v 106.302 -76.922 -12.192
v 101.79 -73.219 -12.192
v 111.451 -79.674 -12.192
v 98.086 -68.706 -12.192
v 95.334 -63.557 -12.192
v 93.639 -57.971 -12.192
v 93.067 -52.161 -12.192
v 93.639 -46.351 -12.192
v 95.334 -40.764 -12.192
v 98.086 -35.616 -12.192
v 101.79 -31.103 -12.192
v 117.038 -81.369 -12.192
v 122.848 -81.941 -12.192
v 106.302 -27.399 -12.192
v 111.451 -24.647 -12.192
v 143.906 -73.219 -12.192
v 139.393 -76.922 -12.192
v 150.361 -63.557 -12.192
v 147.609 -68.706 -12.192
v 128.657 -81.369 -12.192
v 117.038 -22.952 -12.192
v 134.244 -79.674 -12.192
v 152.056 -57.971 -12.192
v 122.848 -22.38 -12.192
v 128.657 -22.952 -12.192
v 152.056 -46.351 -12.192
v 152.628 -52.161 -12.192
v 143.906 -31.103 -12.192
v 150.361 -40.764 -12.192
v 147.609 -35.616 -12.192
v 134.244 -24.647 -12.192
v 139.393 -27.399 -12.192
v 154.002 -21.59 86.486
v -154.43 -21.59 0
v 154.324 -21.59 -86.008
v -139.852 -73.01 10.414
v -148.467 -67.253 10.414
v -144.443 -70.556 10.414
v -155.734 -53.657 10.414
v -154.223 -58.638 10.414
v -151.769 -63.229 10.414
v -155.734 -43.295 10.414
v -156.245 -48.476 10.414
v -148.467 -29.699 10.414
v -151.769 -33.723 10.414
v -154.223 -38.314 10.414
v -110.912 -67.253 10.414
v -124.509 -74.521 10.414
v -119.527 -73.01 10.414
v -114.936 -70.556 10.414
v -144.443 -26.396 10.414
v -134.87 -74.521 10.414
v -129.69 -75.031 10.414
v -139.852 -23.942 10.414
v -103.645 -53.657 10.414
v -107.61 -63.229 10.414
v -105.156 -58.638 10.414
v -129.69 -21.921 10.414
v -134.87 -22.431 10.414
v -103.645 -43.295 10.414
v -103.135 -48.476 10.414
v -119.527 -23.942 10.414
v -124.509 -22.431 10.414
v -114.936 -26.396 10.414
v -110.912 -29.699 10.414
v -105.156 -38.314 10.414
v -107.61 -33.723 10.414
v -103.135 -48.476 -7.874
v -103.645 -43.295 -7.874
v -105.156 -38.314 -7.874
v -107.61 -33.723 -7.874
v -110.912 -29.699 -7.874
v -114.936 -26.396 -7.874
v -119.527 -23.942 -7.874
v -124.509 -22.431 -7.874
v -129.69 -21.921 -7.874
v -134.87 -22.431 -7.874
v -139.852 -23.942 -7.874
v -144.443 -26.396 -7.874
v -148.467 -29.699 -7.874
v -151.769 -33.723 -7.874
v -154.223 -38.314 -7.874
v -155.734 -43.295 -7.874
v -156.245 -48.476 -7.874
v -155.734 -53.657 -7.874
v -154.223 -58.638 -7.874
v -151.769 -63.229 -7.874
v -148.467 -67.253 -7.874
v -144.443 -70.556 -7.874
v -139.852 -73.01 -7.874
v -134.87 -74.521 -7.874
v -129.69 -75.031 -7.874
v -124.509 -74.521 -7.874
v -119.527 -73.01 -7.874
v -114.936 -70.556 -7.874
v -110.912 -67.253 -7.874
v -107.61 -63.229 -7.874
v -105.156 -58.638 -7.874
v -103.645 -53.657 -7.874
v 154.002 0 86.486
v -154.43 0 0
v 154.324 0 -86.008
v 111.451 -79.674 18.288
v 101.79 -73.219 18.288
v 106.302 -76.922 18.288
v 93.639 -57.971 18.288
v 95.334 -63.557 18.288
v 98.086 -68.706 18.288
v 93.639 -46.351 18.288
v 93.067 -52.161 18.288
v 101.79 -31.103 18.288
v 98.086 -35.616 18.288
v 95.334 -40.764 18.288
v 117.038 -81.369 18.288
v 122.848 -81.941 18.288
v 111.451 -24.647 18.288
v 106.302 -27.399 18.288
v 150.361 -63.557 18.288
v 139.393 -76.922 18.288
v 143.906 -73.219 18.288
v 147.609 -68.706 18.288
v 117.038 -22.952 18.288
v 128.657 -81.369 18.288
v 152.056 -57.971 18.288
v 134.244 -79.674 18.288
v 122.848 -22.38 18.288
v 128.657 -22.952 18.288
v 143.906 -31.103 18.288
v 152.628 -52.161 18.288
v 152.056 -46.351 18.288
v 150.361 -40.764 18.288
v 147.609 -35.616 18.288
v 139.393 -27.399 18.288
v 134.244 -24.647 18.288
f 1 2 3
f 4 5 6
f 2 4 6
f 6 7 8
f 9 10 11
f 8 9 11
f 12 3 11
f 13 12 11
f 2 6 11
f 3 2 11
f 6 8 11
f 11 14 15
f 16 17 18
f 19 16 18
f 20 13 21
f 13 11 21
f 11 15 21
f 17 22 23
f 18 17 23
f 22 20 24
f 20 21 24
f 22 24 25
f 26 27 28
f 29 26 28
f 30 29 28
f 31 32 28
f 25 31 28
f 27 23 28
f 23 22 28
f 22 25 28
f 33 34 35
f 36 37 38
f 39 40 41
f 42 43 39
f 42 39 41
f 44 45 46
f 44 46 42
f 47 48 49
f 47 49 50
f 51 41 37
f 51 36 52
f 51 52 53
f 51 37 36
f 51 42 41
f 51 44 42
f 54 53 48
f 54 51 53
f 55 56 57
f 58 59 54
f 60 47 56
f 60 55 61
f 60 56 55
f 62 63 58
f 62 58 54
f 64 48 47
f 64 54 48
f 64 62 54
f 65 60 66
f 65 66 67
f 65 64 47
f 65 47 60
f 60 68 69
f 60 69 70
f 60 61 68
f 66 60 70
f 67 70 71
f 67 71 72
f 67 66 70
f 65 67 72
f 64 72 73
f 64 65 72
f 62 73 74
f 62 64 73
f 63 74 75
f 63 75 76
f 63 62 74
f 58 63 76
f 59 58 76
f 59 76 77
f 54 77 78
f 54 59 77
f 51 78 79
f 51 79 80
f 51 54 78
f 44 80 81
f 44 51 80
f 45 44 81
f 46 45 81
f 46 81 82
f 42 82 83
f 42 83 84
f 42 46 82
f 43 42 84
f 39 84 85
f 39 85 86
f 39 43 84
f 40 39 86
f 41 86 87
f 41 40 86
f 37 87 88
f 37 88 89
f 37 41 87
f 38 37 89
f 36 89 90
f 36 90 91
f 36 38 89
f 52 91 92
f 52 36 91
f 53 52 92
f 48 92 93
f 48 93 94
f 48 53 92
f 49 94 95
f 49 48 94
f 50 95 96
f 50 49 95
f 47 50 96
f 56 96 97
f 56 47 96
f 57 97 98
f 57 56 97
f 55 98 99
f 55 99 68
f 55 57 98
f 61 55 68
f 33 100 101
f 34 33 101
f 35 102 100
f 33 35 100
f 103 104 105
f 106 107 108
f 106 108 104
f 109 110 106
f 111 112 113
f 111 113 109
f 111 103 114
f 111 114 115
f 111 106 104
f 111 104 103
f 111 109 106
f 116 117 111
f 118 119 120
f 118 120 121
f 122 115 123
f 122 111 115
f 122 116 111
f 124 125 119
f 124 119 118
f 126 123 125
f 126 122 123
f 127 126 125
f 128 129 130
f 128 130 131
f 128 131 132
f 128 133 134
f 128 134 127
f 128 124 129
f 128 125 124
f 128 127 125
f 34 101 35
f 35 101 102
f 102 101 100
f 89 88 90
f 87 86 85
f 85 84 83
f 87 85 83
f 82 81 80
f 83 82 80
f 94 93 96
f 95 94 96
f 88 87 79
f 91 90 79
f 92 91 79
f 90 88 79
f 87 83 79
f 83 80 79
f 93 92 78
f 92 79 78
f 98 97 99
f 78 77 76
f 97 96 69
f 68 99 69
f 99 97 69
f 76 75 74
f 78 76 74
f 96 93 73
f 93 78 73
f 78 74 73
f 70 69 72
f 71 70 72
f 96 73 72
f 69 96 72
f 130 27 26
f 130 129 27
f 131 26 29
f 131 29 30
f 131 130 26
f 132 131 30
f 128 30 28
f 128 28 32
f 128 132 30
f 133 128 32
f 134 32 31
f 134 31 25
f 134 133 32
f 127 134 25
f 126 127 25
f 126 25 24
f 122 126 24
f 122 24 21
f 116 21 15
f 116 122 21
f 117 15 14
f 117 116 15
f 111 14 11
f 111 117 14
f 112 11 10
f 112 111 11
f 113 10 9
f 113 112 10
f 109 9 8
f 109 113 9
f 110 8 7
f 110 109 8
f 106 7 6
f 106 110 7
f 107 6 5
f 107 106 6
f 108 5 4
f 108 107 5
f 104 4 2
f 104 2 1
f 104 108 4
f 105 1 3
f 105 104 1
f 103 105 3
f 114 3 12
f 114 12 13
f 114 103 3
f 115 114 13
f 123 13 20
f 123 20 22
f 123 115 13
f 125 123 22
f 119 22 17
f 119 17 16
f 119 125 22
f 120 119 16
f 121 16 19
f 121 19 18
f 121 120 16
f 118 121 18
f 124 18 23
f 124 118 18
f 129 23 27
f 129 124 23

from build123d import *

# Parameters (mm, degrees)
F1_DEPTH      = 21.59
F2_R          = 26.555056
F3_DEPTH      = 10.414
F3_DEPTH_BACK = 7.874
F4_R          = 29.780474
F5_DEPTH      = 7.874
F5_DEPTH_BACK = 22.606


with BuildPart() as f1:
    # F0 (on Front) → F1 (new body)
    with BuildSketch(Plane.XZ):
        Polygon((154.001862, 86.486042), (-154.429659, 0), (154.323518, -86.007938), align=None)
    extrude(amount=F1_DEPTH)


with BuildPart() as f3:
    # F2 (on Top) → F3 (new body, two sides)
    with BuildSketch(Plane.XY) as f3_sk:
        with Locations((-129.689559, -48.475929)):
            Circle(F2_R)
    extrude(amount=F3_DEPTH)
    extrude(f3_sk.sketch, amount=-F3_DEPTH_BACK)


with BuildPart() as f5:
    # F4 (on face) → F5 (new body, two sides)
    with BuildSketch(Plane.XY.offset(10.414)) as f5_sk:
        with Locations((122.847579, -52.160703)):
            Circle(F4_R)
    extrude(amount=F5_DEPTH)
    extrude(f5_sk.sketch, amount=-F5_DEPTH_BACK)


solid = Compound([f1.part, f3.part, f5.part])
